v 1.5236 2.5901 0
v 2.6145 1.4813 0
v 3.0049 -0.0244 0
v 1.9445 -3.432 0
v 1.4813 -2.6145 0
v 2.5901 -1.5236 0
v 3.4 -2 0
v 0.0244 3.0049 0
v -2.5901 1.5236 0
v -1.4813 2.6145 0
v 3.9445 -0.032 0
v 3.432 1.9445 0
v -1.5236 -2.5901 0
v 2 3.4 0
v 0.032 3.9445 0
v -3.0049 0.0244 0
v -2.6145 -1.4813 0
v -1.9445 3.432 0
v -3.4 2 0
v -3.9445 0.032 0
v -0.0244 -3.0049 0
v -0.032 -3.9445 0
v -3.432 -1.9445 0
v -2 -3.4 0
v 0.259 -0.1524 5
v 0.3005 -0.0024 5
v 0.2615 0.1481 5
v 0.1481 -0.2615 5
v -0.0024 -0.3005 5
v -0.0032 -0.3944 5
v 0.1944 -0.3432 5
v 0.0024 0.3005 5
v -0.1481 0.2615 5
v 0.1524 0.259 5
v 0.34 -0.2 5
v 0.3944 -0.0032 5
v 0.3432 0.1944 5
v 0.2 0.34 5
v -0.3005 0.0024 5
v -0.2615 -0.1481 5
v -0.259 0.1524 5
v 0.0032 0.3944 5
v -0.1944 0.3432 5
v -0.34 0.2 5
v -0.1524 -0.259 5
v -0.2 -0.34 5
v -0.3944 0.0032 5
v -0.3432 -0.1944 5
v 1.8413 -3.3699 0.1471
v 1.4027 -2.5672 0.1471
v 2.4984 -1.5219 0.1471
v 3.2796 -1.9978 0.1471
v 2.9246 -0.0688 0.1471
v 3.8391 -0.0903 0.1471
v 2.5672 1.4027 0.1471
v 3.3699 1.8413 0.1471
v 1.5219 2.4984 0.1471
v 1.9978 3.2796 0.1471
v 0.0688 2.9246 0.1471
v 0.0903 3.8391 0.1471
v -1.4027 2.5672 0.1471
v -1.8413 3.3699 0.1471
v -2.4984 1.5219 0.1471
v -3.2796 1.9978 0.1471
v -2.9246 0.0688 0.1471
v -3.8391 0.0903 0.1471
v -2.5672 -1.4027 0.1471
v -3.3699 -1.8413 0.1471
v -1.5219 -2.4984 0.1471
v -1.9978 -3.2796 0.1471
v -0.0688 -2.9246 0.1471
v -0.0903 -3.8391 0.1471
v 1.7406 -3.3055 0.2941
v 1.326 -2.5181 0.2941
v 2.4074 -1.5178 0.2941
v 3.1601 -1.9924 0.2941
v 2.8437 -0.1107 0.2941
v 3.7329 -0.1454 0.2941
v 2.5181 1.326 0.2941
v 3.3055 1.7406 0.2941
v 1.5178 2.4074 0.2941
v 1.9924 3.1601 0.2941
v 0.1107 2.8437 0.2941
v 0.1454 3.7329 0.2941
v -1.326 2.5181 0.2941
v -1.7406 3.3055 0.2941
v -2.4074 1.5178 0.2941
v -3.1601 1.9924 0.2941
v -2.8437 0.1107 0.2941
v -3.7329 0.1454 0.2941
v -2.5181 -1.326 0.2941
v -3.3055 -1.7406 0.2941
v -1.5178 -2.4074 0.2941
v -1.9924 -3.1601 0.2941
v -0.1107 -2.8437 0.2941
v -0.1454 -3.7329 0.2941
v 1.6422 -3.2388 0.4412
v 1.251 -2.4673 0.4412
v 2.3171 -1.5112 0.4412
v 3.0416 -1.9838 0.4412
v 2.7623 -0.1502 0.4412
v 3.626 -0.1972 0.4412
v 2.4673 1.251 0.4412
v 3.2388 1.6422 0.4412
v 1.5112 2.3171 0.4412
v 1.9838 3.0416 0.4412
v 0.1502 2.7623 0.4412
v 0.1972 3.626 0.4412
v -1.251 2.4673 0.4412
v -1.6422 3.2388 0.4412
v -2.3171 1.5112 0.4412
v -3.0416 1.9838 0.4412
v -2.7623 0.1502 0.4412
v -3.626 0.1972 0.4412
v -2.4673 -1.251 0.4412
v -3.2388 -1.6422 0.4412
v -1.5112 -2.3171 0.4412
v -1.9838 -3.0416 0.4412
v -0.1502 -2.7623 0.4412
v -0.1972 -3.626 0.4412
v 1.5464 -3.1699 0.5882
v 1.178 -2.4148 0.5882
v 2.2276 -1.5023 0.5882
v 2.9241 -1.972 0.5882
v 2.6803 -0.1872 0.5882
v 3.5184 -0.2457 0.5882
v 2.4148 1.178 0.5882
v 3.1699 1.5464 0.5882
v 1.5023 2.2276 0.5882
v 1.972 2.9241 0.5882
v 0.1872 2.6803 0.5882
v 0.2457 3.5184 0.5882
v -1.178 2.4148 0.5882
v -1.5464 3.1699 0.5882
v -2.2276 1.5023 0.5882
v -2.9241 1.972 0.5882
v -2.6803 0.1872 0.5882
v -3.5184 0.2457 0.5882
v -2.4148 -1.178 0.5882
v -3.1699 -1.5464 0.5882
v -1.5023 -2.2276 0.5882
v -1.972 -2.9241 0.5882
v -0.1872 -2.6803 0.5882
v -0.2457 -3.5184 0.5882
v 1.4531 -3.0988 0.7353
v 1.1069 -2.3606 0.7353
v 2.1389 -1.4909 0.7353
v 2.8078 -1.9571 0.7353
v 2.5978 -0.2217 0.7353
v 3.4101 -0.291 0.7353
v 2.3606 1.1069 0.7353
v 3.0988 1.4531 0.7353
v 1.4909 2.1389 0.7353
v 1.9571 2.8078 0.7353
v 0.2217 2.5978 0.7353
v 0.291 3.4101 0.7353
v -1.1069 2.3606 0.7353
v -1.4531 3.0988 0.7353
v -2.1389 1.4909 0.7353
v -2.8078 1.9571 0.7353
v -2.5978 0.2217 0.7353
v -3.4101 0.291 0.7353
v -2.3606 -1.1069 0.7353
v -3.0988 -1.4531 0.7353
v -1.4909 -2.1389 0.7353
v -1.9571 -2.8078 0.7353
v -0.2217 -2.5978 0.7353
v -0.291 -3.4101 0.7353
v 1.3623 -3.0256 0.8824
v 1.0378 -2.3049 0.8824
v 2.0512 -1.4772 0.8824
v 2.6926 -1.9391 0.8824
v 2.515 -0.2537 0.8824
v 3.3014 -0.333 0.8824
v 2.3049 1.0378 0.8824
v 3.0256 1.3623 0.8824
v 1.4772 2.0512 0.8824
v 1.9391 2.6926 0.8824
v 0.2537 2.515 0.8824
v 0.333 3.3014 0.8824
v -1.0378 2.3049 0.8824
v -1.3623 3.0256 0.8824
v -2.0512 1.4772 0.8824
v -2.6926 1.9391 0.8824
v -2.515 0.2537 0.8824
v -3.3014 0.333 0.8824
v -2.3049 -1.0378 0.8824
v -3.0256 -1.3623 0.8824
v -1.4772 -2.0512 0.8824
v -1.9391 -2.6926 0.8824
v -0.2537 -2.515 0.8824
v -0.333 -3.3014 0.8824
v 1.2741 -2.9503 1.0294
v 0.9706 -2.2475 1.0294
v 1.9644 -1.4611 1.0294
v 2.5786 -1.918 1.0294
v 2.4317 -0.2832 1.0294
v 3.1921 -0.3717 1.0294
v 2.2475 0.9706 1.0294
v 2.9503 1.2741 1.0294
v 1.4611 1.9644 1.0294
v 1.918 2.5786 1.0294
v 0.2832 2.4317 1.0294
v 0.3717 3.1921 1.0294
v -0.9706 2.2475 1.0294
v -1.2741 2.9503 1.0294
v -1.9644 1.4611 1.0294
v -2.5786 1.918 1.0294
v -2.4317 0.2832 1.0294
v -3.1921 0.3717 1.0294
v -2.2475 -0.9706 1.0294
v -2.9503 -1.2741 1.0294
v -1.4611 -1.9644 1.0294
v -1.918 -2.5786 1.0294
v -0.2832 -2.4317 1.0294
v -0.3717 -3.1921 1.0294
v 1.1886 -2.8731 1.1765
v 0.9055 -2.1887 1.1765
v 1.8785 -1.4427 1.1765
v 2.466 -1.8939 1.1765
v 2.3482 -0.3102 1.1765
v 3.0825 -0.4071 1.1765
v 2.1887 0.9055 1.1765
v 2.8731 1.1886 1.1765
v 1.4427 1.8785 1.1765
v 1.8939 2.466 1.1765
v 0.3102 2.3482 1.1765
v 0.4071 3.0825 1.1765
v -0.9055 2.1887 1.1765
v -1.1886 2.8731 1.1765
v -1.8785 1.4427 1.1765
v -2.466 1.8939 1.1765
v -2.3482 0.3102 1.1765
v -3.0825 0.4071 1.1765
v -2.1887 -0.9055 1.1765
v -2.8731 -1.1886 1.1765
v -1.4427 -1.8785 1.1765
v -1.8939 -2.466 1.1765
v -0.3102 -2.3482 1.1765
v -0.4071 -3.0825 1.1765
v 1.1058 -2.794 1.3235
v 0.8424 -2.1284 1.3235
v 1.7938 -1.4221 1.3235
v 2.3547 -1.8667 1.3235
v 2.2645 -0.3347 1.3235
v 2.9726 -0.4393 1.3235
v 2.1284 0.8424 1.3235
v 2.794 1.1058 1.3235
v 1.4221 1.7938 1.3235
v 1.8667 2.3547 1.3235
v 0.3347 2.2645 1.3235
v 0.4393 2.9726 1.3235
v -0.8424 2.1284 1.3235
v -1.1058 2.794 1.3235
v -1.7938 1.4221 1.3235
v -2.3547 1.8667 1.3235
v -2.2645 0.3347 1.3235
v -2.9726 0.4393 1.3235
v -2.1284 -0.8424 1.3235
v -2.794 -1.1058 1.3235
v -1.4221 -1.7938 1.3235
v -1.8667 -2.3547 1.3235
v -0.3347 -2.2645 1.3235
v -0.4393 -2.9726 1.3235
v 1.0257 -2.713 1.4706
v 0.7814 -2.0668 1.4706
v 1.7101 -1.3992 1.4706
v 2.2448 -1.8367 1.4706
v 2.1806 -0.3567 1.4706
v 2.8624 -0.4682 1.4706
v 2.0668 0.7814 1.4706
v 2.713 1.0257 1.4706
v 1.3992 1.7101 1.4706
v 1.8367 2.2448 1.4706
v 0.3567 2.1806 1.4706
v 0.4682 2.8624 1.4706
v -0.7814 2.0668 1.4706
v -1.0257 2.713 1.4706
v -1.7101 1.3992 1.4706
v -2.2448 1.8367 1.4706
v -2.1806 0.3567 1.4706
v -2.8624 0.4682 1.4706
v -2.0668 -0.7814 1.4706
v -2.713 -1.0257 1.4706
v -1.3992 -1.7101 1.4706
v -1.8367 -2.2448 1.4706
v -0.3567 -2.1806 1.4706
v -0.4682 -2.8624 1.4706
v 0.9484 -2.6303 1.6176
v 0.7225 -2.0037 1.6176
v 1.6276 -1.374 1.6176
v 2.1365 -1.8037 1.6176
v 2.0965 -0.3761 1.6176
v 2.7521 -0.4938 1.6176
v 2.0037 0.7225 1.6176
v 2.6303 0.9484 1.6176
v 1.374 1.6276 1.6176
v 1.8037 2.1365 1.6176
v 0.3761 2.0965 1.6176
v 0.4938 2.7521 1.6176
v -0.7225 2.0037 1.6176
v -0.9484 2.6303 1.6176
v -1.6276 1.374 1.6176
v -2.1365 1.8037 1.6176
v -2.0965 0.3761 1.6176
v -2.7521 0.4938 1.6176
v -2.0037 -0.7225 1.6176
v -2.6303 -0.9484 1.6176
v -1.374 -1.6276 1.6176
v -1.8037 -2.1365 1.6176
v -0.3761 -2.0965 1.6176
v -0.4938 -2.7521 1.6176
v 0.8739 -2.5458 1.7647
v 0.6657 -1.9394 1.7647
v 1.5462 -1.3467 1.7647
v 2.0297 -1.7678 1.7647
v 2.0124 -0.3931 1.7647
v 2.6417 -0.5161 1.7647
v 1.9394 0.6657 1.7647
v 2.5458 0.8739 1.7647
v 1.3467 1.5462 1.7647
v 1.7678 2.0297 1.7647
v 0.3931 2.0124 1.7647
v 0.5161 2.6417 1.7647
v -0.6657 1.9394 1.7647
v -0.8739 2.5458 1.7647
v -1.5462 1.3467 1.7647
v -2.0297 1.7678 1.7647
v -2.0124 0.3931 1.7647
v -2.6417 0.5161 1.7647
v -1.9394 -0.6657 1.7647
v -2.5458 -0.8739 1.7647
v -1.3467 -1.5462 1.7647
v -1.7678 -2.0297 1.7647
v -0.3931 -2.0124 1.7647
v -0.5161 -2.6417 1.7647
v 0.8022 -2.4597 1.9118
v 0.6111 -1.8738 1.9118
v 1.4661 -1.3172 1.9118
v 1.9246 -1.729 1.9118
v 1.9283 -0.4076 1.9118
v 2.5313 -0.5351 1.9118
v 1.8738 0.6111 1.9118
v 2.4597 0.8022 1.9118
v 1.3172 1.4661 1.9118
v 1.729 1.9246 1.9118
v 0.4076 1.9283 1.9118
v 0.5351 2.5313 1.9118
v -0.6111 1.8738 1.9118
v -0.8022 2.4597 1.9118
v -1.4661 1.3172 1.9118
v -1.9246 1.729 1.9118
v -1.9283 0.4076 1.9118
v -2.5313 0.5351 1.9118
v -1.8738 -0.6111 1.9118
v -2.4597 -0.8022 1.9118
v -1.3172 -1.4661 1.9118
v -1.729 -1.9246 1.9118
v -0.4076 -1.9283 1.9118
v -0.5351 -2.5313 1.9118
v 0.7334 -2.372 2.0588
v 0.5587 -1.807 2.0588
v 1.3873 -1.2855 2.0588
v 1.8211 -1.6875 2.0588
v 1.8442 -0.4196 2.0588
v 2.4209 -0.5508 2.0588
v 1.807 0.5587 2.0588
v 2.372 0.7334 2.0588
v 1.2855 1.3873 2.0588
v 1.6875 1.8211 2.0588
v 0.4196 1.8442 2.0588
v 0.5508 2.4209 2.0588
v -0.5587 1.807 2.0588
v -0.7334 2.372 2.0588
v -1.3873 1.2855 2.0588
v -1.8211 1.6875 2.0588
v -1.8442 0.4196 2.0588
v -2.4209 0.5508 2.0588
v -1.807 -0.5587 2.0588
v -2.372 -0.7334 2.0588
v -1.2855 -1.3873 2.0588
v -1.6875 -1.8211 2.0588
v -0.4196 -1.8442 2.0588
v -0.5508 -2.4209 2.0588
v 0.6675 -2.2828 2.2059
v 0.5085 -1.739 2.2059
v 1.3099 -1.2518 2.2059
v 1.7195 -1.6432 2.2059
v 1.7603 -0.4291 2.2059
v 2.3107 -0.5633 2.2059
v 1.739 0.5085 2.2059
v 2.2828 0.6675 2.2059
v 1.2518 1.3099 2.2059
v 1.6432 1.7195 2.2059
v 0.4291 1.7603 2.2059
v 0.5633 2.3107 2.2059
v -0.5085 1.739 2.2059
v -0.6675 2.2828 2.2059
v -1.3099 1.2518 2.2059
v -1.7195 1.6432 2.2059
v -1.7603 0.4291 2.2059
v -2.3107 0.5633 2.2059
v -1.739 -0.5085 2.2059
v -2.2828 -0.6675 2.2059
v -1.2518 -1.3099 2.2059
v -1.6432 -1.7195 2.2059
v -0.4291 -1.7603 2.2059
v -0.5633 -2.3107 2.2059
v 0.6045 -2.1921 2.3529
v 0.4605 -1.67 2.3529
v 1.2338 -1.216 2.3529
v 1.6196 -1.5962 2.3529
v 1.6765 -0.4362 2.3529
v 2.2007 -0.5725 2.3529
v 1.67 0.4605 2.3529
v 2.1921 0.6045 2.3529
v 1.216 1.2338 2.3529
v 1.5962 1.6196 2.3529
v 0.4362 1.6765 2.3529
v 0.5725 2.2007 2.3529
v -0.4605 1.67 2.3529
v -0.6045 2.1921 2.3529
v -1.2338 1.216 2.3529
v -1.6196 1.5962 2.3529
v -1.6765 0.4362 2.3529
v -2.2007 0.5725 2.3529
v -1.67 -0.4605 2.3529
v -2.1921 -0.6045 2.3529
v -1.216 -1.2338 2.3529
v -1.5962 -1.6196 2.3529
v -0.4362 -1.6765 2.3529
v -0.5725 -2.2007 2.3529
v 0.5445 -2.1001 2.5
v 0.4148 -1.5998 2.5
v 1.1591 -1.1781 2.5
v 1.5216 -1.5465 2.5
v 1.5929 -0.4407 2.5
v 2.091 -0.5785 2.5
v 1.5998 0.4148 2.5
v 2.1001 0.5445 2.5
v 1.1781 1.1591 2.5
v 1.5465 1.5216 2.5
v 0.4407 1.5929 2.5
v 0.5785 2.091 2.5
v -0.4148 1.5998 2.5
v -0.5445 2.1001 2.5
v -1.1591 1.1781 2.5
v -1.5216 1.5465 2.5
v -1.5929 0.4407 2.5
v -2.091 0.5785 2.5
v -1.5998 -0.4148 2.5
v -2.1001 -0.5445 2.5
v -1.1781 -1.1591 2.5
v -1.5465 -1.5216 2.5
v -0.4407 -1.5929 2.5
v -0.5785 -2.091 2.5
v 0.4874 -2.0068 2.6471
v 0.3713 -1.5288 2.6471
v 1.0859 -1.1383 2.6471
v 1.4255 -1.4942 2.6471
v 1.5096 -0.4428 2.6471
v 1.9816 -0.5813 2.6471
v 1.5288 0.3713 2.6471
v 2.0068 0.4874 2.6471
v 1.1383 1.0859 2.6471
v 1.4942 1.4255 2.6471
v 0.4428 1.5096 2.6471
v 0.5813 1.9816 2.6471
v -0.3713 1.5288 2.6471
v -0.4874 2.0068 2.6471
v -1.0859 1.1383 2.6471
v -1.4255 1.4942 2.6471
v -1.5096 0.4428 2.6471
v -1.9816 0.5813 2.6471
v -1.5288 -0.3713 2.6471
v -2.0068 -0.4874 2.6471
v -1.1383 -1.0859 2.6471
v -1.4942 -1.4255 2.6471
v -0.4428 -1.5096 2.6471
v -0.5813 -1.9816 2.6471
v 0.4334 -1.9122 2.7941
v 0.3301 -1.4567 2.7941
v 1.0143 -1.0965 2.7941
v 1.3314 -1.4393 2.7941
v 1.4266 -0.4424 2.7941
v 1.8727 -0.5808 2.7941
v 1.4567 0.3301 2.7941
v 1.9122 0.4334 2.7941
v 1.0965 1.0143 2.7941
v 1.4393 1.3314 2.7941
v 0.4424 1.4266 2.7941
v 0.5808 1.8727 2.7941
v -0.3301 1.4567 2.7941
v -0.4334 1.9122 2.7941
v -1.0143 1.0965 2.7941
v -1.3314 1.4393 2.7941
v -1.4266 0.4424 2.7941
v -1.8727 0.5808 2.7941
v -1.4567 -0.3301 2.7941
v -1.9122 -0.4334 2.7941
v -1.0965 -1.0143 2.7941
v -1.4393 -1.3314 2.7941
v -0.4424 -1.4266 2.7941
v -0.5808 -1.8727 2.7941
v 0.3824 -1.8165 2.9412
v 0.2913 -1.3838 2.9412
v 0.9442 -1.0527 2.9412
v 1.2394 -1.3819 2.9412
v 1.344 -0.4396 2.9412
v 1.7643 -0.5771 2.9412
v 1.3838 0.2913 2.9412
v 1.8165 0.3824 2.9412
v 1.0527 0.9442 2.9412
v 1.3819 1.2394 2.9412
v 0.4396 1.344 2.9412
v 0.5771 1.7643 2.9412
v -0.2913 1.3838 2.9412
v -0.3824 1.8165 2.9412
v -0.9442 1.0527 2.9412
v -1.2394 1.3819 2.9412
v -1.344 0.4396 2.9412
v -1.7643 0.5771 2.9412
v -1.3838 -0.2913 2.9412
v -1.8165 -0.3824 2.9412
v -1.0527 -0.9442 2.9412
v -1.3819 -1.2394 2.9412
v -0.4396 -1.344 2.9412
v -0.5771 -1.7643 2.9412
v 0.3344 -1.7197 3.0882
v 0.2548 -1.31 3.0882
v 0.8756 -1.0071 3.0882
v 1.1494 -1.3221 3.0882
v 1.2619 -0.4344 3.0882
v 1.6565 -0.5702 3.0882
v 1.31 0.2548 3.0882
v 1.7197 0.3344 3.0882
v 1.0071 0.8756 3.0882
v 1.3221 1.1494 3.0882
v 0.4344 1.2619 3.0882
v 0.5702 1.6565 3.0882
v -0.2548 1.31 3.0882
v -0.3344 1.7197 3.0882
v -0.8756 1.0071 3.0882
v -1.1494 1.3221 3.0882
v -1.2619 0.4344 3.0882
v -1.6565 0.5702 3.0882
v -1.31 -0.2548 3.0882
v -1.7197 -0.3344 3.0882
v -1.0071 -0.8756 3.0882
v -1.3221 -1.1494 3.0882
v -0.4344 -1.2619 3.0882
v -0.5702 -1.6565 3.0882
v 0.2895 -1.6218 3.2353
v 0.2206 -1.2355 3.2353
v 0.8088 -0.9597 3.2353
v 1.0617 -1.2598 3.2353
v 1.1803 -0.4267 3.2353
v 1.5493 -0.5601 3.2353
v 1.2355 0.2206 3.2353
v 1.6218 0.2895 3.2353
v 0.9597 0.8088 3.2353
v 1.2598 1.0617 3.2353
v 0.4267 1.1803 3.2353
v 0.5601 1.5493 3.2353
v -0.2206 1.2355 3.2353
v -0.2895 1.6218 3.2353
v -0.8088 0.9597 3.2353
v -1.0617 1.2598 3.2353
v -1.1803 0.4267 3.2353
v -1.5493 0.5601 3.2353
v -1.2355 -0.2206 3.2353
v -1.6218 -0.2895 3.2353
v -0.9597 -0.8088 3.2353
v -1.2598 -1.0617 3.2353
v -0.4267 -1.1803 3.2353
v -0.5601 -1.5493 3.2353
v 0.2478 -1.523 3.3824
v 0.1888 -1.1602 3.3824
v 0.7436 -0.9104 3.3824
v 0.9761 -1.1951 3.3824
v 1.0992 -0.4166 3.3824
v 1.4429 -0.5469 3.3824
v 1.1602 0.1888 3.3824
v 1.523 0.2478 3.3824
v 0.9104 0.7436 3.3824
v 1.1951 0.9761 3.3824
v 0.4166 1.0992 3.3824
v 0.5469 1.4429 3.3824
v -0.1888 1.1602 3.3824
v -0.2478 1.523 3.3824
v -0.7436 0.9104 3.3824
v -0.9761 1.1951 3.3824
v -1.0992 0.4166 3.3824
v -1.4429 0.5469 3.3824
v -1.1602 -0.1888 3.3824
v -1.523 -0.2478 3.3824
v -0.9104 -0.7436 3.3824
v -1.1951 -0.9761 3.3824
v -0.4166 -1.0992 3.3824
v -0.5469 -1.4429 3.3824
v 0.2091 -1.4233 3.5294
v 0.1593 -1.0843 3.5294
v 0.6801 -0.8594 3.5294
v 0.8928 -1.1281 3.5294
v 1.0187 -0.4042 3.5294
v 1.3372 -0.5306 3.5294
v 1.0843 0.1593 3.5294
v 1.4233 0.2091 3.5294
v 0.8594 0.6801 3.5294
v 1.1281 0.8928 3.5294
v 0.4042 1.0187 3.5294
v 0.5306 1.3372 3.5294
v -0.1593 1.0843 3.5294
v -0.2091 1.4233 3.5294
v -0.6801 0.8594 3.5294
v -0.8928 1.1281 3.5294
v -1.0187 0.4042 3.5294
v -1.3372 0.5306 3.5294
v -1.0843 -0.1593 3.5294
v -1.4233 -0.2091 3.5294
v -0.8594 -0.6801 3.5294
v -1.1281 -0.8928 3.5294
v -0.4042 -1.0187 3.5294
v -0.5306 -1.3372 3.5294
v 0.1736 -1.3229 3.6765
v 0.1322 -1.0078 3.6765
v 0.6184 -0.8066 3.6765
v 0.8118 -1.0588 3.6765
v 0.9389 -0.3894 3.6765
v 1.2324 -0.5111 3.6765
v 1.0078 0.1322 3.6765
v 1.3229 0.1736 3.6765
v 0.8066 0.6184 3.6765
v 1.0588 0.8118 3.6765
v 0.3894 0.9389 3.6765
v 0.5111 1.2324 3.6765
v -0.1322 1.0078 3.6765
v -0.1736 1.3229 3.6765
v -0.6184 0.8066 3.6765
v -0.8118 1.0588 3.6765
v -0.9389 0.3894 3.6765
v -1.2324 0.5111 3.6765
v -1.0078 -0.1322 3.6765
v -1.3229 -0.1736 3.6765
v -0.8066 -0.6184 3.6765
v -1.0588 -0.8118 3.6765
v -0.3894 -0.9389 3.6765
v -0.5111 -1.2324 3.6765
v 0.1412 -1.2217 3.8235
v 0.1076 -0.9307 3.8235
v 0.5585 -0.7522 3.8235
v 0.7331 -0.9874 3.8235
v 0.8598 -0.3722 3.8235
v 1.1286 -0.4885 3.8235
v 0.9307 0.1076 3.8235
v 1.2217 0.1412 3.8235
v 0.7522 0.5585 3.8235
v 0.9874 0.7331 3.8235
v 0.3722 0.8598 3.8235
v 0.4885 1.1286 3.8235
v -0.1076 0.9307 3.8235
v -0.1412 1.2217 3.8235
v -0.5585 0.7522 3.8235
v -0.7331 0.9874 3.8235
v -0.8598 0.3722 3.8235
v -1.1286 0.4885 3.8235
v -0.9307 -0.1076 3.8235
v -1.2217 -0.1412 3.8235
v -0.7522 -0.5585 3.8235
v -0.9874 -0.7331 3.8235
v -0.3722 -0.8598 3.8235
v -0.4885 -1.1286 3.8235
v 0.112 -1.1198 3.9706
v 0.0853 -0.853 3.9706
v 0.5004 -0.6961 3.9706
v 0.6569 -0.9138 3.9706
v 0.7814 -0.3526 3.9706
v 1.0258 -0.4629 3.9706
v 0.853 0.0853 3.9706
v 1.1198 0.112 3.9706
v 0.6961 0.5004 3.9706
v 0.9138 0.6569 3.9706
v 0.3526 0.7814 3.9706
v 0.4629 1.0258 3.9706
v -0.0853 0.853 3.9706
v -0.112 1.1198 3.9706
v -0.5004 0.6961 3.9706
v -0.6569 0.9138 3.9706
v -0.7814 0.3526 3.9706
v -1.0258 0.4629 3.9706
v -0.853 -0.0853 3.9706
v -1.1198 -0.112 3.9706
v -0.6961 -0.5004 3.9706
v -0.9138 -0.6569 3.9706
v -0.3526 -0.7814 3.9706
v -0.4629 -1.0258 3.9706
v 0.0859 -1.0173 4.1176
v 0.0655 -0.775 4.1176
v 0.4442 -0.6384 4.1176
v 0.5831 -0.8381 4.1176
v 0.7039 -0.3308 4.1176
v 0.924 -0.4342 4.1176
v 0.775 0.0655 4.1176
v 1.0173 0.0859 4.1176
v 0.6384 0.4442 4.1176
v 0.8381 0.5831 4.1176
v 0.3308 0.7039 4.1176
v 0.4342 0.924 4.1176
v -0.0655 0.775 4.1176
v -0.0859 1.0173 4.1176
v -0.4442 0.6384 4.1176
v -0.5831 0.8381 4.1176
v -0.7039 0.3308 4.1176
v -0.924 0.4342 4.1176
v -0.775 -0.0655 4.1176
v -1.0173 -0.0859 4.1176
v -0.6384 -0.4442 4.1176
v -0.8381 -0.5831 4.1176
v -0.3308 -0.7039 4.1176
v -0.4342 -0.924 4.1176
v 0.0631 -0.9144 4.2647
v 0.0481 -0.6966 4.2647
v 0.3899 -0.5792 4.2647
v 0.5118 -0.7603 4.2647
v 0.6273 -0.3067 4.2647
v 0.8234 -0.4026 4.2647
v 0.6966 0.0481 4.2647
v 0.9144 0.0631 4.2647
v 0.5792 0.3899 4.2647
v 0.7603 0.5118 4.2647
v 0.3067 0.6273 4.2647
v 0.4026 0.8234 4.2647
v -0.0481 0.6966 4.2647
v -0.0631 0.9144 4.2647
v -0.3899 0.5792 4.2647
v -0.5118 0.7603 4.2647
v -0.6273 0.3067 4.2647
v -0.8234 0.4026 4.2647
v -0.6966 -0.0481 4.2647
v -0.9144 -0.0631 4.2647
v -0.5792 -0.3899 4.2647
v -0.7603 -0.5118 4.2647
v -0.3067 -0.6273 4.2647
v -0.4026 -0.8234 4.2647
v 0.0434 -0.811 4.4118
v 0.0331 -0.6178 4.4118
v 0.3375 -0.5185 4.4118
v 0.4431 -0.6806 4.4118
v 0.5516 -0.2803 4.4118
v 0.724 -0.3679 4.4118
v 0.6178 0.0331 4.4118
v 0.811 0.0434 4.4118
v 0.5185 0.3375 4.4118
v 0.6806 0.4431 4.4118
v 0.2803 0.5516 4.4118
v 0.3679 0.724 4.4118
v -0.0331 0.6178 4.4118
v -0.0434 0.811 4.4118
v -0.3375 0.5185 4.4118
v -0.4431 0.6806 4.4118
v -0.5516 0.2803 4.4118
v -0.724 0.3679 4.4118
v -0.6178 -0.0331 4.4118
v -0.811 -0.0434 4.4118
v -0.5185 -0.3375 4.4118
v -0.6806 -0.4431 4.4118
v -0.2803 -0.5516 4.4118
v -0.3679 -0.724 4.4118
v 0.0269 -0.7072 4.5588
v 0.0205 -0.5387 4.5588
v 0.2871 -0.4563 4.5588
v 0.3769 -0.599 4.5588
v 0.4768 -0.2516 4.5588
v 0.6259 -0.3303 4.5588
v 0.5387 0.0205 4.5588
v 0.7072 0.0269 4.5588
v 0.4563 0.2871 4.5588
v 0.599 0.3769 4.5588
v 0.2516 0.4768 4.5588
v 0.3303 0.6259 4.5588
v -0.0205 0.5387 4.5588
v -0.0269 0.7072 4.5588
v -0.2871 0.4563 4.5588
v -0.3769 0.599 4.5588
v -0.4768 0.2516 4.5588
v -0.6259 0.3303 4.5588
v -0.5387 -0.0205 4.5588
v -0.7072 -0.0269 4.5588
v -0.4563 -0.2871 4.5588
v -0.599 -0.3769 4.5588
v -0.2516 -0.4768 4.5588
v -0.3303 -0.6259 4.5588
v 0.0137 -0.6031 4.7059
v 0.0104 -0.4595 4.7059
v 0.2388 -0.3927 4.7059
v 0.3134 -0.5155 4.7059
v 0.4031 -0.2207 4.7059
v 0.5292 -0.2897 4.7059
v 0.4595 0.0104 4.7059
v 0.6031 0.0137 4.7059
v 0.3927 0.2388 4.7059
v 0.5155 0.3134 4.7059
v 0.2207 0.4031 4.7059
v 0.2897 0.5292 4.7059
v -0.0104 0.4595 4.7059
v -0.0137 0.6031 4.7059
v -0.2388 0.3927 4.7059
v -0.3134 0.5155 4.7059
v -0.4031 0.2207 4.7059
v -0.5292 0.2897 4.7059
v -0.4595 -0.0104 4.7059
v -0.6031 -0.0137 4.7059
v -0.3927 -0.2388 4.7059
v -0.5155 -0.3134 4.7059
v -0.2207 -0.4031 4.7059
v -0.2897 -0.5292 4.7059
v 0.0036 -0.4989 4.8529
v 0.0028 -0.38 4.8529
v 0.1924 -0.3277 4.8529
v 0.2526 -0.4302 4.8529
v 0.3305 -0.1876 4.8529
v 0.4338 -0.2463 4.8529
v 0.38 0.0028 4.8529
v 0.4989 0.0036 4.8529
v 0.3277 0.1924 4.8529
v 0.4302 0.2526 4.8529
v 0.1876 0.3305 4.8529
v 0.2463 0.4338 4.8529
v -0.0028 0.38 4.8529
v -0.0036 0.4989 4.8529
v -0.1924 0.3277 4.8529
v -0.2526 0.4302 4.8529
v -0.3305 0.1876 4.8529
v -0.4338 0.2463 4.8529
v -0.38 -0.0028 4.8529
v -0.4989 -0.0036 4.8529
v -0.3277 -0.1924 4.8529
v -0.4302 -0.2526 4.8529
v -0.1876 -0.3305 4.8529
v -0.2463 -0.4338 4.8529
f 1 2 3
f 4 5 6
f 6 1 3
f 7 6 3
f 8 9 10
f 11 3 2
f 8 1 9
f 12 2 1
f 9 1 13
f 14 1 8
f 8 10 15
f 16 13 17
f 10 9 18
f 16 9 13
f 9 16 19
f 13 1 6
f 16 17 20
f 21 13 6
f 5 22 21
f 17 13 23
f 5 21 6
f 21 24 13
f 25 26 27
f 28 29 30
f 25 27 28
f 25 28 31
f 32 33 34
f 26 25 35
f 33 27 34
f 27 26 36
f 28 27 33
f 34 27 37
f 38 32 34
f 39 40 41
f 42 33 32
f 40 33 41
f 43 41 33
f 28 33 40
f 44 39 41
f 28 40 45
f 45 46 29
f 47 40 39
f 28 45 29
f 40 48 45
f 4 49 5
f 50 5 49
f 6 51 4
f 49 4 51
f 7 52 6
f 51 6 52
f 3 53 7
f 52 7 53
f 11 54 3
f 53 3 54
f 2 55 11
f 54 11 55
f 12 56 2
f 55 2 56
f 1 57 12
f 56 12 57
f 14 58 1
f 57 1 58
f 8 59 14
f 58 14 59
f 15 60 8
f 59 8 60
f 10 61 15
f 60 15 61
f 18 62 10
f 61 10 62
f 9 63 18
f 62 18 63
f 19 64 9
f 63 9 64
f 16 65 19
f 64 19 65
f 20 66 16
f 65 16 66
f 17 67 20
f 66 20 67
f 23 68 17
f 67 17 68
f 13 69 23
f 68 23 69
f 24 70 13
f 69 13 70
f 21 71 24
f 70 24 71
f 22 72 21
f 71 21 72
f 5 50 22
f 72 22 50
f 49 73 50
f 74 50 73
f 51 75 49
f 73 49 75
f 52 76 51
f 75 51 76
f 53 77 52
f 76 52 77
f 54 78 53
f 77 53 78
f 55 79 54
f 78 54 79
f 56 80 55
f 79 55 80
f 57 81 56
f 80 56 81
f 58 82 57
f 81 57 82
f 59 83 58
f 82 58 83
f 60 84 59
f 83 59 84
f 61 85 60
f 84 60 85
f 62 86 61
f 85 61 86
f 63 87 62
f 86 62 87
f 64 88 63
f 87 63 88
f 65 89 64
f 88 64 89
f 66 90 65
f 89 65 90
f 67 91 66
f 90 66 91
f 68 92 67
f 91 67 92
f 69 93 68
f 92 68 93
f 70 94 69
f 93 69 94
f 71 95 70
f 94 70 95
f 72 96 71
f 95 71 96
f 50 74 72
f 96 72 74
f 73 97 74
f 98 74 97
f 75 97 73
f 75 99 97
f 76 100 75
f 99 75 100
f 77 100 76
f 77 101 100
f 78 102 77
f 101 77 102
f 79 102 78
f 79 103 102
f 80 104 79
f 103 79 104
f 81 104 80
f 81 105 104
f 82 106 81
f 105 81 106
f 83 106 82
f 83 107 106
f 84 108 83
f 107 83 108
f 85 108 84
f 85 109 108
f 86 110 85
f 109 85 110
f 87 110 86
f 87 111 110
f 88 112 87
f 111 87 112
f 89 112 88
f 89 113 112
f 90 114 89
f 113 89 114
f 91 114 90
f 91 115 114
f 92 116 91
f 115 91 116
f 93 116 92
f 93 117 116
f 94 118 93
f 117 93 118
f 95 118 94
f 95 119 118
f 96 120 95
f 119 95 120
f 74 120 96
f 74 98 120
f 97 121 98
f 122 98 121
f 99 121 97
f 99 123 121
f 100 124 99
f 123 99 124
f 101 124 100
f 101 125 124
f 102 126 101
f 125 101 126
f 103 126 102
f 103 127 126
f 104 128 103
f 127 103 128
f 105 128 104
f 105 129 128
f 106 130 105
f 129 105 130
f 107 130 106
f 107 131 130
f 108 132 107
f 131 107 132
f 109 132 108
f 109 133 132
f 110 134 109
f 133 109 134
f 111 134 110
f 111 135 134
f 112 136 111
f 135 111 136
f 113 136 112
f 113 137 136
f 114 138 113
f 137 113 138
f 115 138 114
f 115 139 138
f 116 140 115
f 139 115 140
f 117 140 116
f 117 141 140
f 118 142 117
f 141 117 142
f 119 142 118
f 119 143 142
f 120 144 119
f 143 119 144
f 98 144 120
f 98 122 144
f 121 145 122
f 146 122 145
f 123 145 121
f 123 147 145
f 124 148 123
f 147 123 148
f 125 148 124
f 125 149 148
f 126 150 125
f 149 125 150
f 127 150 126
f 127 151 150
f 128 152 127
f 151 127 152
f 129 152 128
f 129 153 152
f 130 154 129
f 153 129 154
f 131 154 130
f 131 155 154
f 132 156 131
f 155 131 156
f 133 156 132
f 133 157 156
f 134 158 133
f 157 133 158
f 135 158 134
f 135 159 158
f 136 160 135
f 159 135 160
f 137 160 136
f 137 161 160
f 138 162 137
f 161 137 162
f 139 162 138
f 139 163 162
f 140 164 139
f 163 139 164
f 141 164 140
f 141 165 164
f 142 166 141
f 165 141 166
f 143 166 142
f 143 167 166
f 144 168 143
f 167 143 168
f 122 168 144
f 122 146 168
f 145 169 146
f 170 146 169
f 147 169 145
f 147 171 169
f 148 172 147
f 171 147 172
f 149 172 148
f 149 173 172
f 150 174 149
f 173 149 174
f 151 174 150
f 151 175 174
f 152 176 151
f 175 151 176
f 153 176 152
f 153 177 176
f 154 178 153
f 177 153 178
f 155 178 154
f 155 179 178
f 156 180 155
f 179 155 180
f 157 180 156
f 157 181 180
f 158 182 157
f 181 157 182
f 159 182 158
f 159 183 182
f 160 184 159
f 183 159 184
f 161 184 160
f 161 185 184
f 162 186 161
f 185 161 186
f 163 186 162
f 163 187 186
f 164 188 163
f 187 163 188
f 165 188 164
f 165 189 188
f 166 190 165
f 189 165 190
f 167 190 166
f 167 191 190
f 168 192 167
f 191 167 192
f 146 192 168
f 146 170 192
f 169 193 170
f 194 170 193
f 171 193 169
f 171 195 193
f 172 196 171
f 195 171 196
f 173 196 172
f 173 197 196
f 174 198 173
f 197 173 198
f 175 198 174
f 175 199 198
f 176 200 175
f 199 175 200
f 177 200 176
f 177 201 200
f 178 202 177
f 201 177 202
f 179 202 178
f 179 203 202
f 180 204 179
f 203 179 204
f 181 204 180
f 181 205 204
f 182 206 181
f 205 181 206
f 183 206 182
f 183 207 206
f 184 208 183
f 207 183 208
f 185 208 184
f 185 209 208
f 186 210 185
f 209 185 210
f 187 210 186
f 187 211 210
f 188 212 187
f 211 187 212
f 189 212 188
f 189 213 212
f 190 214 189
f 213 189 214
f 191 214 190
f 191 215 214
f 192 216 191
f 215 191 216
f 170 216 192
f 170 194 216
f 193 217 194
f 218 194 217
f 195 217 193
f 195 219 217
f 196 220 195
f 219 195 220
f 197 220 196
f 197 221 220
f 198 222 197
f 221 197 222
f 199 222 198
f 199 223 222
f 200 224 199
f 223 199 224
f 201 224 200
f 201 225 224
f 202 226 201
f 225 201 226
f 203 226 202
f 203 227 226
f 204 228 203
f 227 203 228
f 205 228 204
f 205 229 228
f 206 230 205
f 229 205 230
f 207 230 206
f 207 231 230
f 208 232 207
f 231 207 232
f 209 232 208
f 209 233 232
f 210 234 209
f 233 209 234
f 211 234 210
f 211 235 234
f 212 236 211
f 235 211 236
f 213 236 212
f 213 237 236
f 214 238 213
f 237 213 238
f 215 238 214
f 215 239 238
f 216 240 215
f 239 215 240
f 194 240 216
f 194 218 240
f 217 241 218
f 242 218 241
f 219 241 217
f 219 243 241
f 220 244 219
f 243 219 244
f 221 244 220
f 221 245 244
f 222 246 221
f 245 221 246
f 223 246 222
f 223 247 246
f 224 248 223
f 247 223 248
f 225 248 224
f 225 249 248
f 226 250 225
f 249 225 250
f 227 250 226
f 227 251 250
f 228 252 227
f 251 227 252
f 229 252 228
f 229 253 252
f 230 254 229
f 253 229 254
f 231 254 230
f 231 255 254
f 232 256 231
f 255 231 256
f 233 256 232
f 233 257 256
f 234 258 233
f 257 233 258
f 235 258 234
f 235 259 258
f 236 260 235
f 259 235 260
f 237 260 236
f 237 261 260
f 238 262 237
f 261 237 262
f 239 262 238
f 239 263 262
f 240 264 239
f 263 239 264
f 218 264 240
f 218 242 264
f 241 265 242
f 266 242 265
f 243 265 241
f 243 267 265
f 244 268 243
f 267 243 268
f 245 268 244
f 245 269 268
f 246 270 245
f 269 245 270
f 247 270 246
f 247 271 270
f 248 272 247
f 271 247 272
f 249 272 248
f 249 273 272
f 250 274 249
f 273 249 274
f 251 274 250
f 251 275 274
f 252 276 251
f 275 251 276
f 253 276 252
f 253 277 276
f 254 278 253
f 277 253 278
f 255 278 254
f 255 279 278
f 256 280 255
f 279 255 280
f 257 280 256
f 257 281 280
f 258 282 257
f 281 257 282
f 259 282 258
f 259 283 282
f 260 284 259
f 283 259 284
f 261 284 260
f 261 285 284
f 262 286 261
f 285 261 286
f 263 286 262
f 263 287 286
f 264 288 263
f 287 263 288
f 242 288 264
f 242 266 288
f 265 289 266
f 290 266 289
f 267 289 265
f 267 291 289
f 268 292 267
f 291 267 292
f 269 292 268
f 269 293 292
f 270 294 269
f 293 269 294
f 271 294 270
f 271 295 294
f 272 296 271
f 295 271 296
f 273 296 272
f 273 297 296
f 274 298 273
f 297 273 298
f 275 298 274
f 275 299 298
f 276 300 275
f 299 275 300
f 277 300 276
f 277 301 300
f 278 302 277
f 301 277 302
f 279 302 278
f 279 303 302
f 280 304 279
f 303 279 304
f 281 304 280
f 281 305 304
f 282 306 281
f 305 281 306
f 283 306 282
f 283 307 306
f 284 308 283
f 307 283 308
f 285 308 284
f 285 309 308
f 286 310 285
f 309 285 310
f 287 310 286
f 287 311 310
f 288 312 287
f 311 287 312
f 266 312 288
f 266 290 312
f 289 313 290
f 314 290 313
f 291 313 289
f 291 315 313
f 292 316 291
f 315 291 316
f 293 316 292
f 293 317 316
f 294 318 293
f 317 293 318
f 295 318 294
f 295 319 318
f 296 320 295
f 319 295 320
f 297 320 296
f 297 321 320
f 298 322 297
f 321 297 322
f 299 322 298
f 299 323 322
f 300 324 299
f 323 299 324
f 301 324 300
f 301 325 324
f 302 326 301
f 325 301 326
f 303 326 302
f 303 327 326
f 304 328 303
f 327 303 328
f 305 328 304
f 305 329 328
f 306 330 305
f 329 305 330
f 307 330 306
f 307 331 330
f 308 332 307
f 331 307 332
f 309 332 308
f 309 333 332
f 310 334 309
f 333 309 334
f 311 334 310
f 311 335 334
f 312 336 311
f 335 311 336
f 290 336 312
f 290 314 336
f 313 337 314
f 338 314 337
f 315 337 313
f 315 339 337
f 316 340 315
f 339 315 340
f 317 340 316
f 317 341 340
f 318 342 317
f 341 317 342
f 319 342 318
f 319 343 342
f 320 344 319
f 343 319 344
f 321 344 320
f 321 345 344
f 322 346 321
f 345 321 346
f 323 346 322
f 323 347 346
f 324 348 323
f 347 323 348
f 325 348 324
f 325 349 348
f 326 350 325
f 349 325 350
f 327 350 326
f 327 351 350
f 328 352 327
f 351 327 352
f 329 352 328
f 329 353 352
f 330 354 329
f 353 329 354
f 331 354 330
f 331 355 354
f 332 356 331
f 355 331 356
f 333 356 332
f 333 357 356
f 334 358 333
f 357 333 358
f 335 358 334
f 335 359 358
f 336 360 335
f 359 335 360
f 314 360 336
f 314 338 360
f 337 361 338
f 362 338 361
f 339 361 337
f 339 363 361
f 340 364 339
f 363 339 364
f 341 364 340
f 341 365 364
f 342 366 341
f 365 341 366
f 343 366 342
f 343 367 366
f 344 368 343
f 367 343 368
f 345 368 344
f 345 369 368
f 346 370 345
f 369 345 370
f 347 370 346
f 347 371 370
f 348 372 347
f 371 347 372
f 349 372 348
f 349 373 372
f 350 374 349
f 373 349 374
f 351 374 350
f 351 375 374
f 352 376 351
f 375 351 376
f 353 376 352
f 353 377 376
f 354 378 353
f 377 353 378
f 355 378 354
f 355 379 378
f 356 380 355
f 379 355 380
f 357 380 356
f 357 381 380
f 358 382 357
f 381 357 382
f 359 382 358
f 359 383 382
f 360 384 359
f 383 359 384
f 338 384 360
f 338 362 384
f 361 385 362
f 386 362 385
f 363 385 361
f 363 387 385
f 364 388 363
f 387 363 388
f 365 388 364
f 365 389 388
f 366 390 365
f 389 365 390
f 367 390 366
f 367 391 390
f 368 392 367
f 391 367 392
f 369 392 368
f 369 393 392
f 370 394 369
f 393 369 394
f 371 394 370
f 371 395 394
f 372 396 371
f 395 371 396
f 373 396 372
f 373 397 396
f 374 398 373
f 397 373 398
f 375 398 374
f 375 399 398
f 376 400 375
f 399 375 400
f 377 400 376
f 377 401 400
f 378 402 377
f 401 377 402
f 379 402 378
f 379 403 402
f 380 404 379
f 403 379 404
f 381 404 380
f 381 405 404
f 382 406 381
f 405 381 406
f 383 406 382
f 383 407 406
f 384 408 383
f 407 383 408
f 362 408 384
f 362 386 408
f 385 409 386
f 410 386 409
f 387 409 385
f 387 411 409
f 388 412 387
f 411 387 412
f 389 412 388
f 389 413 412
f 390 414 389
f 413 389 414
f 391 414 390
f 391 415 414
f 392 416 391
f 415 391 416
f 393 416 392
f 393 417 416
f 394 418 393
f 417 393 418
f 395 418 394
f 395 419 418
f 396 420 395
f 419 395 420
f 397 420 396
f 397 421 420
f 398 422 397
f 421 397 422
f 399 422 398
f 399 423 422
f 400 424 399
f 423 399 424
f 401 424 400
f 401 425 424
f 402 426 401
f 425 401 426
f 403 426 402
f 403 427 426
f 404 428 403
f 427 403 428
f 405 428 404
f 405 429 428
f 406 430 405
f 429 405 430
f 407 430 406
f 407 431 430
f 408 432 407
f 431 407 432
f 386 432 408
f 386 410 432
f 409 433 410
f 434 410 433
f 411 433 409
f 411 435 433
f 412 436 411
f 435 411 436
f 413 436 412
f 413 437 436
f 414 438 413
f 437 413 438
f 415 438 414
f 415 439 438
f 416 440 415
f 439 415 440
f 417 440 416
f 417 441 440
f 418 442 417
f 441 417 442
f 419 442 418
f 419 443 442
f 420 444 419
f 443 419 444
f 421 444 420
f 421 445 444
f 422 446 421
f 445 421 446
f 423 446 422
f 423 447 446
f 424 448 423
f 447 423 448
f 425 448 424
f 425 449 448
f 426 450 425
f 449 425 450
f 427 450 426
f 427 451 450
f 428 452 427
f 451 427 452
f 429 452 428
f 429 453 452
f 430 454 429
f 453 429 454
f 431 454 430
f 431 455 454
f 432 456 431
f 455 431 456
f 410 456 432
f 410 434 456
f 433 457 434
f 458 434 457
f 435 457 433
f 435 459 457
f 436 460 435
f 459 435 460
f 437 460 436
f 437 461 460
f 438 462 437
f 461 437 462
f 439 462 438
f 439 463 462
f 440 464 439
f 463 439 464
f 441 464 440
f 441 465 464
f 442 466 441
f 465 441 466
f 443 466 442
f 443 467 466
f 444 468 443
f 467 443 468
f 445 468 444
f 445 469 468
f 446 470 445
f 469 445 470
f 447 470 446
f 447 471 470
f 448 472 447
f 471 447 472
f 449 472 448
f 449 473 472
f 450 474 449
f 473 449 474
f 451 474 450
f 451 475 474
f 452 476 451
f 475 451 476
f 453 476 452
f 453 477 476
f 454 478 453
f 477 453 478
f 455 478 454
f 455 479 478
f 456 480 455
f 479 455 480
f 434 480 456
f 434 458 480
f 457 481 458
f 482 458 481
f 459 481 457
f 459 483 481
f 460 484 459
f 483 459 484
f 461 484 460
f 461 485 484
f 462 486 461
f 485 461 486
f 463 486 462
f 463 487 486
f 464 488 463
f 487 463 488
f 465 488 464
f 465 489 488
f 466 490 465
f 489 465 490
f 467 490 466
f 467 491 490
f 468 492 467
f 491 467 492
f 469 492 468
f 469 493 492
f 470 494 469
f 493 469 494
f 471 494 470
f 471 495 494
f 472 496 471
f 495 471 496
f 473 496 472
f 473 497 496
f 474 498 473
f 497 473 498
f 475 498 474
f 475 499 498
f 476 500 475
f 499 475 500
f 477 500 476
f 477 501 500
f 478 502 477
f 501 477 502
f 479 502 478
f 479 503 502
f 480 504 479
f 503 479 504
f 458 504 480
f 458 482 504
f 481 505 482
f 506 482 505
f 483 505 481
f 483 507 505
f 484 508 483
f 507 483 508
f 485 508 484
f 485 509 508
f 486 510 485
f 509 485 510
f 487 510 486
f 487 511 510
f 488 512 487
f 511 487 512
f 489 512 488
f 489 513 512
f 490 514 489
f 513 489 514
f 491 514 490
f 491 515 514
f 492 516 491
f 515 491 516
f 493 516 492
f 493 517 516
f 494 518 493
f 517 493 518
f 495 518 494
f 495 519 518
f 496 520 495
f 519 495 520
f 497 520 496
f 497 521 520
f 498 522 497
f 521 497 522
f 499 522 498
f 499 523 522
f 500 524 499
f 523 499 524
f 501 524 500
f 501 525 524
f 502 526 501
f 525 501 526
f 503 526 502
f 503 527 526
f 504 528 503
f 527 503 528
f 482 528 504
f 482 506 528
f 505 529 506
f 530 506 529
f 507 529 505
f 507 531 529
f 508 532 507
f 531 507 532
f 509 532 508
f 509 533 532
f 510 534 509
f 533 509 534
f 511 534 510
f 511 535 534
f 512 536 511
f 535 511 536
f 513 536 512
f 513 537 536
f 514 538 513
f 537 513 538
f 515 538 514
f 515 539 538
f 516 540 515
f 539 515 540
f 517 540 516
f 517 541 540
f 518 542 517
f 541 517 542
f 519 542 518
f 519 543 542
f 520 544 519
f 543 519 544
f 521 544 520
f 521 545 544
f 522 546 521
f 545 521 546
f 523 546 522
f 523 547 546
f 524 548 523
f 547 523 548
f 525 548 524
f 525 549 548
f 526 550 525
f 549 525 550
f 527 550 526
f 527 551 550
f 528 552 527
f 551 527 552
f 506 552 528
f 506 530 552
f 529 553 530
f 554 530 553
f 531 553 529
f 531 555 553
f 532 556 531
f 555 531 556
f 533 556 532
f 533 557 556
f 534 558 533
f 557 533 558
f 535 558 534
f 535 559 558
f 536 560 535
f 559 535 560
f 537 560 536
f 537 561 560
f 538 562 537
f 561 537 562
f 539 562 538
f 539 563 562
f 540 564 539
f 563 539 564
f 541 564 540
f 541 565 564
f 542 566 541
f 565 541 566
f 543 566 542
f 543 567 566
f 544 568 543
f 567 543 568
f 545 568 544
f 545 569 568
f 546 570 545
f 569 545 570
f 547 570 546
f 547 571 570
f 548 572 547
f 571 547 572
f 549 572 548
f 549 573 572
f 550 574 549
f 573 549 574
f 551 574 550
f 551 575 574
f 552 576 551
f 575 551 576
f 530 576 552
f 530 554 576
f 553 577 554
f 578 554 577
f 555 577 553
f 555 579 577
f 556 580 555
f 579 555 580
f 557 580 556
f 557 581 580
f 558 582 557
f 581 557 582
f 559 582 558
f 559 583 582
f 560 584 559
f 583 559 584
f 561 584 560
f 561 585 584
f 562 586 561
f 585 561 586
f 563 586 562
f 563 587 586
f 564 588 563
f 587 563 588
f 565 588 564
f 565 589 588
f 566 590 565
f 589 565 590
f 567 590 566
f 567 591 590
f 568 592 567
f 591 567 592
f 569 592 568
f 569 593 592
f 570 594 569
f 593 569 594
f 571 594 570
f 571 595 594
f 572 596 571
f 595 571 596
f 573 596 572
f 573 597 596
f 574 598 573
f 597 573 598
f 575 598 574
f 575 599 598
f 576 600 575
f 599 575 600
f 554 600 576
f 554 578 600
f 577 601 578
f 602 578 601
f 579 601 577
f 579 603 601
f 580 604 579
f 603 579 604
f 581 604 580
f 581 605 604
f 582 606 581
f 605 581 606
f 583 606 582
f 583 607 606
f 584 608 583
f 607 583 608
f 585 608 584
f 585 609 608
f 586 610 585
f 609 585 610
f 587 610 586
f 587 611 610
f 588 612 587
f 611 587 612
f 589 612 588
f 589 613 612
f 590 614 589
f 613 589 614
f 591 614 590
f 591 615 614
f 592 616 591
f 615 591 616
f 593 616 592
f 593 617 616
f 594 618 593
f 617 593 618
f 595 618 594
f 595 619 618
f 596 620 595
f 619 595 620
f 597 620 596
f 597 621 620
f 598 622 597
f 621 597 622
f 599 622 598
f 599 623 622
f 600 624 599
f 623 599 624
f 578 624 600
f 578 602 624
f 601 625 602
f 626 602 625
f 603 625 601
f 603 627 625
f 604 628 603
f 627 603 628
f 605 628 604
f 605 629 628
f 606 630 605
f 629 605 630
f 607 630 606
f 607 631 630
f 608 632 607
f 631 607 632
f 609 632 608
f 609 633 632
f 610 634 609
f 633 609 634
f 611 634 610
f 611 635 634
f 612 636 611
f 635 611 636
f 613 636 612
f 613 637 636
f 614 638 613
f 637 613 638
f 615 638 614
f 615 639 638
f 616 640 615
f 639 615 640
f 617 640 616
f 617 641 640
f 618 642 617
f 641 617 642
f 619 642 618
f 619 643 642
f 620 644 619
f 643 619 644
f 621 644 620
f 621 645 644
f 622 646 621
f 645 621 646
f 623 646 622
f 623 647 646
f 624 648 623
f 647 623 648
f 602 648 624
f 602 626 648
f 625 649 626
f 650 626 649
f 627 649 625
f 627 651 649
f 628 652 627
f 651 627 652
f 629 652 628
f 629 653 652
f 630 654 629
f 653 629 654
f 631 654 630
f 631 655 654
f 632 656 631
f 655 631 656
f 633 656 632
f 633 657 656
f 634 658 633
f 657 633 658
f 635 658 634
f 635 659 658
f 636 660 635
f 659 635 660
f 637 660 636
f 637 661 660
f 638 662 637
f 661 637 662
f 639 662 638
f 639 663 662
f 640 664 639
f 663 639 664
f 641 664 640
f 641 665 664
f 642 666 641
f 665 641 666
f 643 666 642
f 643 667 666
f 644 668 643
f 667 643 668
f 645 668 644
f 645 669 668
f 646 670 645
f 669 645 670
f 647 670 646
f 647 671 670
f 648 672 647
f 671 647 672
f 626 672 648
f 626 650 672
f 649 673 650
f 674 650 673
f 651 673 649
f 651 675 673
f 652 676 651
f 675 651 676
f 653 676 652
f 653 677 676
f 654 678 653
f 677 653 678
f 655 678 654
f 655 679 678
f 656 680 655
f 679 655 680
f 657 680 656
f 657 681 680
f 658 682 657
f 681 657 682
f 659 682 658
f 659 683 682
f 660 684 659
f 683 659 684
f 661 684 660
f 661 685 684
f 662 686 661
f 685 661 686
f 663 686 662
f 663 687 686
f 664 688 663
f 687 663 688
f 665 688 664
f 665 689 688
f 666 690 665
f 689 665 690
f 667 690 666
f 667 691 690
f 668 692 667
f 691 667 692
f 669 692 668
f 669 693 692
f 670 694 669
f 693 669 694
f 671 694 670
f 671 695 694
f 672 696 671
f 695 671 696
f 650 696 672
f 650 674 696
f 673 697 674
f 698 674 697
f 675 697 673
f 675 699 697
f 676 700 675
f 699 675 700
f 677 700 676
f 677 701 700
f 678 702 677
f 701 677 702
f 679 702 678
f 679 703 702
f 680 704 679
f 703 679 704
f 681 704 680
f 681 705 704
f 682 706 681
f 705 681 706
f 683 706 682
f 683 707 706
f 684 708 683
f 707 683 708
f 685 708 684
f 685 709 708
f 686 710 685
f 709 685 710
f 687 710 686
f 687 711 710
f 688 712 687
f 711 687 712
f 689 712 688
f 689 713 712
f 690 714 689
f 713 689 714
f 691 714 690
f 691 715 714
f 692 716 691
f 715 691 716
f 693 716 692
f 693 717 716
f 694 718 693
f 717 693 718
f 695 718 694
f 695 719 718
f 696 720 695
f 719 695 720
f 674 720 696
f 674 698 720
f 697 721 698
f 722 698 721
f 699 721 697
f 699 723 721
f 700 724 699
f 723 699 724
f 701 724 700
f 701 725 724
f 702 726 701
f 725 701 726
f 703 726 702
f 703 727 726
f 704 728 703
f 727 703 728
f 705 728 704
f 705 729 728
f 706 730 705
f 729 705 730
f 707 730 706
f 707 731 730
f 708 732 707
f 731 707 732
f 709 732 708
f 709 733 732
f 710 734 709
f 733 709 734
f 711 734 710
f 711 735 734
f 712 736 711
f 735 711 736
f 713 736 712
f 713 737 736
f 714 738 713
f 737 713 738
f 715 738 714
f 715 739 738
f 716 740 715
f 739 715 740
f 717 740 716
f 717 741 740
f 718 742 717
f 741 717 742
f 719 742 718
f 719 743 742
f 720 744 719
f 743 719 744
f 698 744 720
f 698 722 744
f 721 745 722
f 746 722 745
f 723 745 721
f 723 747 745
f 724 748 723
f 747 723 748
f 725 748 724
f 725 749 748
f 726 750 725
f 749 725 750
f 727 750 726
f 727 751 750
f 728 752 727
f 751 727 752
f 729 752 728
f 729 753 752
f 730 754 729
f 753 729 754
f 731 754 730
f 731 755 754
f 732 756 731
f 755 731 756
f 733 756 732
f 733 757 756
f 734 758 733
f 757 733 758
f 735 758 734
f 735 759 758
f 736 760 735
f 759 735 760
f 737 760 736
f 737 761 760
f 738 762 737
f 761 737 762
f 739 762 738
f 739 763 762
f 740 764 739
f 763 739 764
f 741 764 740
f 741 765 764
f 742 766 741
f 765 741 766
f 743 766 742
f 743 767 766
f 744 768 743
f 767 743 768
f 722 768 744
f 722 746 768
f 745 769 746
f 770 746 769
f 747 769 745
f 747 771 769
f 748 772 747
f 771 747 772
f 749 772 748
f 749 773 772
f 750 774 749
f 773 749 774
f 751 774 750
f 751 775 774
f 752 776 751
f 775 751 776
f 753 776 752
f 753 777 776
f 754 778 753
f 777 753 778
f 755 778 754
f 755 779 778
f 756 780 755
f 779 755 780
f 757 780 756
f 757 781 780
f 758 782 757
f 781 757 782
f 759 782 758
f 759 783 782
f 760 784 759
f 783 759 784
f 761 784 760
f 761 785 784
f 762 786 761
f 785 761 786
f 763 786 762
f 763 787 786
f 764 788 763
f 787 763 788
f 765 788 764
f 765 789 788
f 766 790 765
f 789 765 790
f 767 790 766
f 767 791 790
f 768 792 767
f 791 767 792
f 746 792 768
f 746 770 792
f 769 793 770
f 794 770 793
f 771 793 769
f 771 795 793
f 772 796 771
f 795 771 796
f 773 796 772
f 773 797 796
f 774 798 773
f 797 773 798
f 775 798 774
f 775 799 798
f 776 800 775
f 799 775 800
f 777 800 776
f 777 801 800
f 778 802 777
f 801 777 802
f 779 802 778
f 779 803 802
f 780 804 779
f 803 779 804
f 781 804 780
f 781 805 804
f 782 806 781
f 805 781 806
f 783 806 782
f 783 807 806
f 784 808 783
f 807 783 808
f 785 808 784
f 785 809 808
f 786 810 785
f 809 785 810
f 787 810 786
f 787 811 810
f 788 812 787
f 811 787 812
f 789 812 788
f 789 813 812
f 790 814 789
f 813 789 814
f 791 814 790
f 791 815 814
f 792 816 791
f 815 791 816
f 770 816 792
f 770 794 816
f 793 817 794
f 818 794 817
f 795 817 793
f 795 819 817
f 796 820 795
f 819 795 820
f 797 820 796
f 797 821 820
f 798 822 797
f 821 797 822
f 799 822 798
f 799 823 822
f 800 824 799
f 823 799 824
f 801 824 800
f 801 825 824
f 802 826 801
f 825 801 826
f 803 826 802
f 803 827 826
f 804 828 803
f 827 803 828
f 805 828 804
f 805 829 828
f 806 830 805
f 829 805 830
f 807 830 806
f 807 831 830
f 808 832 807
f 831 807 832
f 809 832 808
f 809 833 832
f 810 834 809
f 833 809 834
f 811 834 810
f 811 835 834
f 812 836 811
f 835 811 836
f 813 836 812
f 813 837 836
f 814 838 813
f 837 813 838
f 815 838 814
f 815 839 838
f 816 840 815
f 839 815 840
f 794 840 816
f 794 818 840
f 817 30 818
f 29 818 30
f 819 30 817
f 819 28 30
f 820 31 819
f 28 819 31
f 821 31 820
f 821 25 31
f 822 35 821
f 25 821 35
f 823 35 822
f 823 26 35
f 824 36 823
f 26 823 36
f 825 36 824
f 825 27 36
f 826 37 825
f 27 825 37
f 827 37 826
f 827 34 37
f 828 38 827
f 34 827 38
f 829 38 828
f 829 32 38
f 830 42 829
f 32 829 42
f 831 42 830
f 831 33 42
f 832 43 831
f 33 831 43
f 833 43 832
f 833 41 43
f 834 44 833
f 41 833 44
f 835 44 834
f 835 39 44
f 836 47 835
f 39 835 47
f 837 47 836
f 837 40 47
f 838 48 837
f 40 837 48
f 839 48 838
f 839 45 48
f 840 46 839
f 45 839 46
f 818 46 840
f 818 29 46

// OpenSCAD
// start and end point
tmin=0;
tmax=3*360;
// number of steps along path
tstep=100;

// path to extrude along
function x(t)=[
t*t,
t*abs(sin(t)),
t*cos(t)
];

// scale
function s(t)=30*t*t;//*cos(t-45);

function twist(t)=180*t/(tmax-tmin);



$fn=400;
linear_extrude(height=5, twist=30, scale=.1)
hej();
translate([0,0,-.5])
hej();

module hej(){
union() {
for(i=[1:11])
{
polygon(points=[[0,0],[0,3],[2,3.4]],paths=[ [0,1,2] ]);
rotate(30*i,[0,0,1])
polygon(points=[[0,0],[0,3],[2,3.4]],paths=[ [0,1,2] ]);
}
}
}
